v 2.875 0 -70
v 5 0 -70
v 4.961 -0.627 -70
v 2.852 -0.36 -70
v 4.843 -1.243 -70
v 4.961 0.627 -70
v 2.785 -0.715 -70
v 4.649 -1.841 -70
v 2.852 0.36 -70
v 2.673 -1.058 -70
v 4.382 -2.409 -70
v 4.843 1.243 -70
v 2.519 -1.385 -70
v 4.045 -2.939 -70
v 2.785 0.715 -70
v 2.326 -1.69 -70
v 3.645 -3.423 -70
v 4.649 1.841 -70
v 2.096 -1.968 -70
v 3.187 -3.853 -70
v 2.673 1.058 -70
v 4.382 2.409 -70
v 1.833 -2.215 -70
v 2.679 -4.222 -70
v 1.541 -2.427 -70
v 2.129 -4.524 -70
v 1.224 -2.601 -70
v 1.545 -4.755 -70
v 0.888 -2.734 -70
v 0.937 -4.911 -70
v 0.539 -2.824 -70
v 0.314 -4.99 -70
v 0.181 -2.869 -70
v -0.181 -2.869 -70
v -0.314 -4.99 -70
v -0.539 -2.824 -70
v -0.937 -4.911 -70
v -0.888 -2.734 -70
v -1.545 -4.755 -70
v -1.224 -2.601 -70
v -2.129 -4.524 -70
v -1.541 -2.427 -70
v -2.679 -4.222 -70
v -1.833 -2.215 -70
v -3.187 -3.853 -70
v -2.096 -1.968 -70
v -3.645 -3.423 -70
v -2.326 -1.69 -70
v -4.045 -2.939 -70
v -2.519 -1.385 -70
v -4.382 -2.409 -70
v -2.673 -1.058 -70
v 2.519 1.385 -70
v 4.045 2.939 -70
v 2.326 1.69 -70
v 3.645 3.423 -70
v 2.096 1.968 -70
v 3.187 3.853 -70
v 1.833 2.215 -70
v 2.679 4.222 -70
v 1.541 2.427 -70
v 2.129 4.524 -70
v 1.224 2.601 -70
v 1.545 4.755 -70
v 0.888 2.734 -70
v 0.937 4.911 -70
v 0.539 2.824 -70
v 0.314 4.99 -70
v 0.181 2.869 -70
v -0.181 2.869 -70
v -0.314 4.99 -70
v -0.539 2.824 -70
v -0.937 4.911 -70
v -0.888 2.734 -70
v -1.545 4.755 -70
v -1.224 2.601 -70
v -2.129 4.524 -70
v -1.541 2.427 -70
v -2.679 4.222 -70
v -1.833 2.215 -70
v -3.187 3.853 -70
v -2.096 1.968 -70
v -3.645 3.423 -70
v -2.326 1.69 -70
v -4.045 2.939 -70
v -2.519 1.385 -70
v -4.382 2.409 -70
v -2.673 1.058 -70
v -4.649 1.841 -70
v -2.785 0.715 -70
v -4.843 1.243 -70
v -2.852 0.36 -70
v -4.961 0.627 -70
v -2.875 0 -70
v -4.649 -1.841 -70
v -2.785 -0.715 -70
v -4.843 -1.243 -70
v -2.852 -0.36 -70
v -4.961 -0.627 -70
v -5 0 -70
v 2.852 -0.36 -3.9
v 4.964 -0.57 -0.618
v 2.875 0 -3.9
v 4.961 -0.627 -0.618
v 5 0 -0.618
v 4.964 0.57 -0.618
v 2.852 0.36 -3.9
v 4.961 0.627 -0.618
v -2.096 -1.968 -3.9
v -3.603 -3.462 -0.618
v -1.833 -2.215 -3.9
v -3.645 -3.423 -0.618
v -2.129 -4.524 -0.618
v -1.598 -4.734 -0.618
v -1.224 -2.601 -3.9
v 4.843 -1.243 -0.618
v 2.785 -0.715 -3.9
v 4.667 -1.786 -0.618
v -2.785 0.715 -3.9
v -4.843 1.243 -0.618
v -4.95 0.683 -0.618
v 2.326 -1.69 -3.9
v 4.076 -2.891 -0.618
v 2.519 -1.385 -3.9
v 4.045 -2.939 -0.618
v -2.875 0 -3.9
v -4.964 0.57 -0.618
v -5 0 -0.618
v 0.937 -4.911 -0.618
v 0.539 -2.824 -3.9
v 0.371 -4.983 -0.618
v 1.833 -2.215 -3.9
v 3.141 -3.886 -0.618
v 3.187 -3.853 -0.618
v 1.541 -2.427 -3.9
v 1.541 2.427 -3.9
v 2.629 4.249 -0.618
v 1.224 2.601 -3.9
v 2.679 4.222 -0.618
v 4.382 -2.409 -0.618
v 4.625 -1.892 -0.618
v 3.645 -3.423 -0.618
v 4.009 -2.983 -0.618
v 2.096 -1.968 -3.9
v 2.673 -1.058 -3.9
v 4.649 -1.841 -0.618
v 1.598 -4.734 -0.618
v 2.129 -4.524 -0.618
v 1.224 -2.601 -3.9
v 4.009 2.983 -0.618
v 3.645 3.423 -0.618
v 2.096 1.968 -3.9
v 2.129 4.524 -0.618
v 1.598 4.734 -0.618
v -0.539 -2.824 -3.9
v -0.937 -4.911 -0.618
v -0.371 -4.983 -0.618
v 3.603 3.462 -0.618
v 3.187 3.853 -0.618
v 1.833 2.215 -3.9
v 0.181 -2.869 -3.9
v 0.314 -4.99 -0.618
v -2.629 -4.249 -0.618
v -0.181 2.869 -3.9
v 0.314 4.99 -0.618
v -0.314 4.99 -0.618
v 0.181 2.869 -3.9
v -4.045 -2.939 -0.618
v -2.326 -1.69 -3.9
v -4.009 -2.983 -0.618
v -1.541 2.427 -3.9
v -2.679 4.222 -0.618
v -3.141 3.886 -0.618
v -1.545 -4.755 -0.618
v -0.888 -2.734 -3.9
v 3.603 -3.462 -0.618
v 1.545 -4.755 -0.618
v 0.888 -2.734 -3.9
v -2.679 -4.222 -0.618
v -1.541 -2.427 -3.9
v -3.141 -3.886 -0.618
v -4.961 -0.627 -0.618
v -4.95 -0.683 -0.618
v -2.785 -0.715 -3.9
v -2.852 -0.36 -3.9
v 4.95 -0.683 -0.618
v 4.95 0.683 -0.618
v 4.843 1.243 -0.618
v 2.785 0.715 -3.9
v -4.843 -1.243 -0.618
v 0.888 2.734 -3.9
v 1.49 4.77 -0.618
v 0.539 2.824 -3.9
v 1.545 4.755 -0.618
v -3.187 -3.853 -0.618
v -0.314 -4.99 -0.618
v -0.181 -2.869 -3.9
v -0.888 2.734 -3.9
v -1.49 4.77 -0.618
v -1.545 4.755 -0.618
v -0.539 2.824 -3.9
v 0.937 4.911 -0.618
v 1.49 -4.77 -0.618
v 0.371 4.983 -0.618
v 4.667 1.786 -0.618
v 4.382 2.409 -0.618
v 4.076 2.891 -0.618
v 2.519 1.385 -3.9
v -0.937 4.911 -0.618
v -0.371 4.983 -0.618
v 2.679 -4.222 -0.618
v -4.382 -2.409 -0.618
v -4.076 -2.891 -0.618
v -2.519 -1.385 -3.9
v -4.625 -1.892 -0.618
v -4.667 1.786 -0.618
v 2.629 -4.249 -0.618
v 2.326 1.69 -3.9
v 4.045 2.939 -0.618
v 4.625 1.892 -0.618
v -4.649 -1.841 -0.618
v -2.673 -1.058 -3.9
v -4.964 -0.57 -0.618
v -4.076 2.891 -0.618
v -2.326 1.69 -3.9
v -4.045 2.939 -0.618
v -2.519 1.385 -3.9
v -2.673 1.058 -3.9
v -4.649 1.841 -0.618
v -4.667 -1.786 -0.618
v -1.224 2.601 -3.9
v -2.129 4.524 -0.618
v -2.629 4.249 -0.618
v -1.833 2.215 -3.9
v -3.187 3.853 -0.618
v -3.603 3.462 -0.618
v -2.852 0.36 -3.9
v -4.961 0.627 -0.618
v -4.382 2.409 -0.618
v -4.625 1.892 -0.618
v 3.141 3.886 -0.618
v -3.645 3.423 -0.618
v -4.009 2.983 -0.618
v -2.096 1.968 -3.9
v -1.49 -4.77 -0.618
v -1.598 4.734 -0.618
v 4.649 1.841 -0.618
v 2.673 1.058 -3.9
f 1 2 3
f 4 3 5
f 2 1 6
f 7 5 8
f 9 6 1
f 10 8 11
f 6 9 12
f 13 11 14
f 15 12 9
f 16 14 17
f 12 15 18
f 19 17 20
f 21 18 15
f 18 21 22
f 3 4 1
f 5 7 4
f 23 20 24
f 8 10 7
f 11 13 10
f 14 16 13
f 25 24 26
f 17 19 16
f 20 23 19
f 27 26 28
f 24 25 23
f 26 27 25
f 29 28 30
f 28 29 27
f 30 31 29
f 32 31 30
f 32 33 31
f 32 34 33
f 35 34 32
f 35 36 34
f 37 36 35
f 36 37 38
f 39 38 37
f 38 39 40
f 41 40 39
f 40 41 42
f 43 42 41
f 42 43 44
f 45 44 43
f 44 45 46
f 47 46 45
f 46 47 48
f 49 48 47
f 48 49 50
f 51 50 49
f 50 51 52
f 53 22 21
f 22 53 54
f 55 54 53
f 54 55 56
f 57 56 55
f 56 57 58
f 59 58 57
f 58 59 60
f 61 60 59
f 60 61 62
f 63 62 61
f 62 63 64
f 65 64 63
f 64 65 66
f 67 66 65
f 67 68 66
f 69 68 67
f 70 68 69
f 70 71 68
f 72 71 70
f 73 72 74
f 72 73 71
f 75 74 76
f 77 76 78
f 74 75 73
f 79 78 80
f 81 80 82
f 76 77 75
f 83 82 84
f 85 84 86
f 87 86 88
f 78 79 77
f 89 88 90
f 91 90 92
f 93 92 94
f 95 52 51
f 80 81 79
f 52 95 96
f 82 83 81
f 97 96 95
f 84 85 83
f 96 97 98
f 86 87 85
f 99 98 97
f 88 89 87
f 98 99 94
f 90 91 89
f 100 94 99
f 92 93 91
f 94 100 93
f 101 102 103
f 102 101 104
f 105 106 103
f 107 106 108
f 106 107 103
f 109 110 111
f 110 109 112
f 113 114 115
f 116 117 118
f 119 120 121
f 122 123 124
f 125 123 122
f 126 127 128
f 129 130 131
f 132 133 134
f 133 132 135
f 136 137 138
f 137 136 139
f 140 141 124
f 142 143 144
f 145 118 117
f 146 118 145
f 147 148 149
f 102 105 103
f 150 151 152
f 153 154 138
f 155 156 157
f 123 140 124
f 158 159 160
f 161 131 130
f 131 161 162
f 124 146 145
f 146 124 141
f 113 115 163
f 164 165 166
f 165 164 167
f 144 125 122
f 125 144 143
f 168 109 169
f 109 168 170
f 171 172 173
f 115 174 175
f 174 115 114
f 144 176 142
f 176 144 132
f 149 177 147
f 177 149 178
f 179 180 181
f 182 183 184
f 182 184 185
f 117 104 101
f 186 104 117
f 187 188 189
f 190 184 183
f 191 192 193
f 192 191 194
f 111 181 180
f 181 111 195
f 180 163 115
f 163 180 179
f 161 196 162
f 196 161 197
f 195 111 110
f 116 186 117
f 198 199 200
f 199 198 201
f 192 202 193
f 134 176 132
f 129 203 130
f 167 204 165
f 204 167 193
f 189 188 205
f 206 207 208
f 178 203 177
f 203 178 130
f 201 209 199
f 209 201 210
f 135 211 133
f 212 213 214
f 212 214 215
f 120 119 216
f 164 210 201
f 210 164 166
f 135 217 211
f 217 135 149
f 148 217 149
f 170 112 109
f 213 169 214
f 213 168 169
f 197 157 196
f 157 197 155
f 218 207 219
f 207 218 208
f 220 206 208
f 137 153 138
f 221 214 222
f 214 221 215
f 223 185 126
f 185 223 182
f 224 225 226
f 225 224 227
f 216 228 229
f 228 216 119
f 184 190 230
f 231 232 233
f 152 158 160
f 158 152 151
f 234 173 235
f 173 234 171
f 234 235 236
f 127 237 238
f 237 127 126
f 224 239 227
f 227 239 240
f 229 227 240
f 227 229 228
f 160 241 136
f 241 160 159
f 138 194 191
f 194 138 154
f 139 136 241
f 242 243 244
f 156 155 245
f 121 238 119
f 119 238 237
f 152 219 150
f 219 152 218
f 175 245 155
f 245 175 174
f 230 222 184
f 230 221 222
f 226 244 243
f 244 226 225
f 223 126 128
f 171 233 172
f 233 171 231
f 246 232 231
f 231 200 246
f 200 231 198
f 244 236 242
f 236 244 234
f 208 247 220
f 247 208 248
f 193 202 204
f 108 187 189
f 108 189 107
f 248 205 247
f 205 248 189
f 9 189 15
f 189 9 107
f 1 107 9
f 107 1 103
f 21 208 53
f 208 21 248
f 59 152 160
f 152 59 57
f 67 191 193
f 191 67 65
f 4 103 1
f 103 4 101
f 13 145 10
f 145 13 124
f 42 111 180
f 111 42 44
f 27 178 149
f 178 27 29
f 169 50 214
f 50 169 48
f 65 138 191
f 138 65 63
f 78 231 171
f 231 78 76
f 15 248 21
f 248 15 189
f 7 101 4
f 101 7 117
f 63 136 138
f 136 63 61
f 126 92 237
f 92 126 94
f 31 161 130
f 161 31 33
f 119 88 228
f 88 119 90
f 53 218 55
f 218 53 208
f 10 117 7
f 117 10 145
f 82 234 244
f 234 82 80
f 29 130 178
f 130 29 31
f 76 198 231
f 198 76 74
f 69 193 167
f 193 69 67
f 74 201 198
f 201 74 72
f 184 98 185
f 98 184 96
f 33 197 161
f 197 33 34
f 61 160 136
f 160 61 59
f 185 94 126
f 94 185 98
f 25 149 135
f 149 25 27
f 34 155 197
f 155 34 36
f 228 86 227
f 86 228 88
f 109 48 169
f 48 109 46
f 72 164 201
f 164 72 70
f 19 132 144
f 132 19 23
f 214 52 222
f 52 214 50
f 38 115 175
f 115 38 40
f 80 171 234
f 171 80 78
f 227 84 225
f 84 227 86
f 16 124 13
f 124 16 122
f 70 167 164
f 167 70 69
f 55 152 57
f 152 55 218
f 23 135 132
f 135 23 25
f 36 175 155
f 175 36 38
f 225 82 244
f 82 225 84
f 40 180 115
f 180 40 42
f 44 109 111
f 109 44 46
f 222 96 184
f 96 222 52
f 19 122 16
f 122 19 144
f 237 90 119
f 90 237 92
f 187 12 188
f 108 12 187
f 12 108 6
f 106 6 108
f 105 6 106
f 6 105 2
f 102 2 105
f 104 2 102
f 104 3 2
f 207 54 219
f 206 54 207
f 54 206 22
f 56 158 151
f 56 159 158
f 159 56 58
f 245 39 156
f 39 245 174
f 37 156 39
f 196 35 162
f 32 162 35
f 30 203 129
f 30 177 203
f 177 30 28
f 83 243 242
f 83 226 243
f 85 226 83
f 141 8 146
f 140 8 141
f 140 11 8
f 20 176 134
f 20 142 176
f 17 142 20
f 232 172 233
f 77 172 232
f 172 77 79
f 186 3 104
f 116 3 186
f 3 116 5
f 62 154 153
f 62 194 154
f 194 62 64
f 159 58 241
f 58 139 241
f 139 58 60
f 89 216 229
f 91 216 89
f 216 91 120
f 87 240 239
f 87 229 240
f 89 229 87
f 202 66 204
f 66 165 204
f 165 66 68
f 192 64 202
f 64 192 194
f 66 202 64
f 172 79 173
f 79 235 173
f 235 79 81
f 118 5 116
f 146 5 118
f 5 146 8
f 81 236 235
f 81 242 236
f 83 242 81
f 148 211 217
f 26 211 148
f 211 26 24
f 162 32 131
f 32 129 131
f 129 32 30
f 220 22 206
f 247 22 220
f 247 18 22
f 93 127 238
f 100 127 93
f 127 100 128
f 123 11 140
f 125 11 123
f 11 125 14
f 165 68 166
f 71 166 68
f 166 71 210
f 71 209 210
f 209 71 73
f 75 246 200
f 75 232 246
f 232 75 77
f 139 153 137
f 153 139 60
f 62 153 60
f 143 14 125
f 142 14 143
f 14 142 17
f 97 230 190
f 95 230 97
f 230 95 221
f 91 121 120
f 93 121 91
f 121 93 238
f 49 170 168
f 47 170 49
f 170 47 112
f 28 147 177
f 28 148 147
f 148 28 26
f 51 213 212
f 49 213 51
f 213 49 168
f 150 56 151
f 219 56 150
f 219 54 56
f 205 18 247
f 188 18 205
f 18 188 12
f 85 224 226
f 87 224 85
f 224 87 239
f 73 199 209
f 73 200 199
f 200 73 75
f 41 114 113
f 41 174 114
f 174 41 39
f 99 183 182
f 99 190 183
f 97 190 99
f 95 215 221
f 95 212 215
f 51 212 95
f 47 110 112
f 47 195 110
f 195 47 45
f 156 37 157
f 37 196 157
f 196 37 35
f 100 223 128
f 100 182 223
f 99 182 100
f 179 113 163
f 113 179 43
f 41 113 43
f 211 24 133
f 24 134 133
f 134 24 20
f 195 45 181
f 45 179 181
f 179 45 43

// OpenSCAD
$fn = 50;


difference() {
	union() {
		translate(v = [0, 0, -70.0000000000]) {
			cylinder(h = 70, r = 5.0000000000);
		}
		cylinder(h = 0, r = 8.0000000000);
	}
	union() {
		translate(v = [0, 0, 0]) {
			rotate(a = [0, 0, 0]) {
				difference() {
					union() {
						#translate(v = [0, 0, -70.0000000000]) {
							cylinder(h = 70, r = 2.6000000000);
						}
						#translate(v = [0, 0, -3.9000000000]) {
							cylinder(h = 3.9000000000, r1 = 2.8750000000, r2 = 5.4000000000);
						}
						#translate(v = [0, 0, -70.0000000000]) {
							cylinder(h = 70, r = 2.8750000000);
						}
						#translate(v = [0, 0, -70.0000000000]) {
							cylinder(h = 70, r = 2.6000000000);
						}
					}
					union();
				}
			}
		}
	}
}
